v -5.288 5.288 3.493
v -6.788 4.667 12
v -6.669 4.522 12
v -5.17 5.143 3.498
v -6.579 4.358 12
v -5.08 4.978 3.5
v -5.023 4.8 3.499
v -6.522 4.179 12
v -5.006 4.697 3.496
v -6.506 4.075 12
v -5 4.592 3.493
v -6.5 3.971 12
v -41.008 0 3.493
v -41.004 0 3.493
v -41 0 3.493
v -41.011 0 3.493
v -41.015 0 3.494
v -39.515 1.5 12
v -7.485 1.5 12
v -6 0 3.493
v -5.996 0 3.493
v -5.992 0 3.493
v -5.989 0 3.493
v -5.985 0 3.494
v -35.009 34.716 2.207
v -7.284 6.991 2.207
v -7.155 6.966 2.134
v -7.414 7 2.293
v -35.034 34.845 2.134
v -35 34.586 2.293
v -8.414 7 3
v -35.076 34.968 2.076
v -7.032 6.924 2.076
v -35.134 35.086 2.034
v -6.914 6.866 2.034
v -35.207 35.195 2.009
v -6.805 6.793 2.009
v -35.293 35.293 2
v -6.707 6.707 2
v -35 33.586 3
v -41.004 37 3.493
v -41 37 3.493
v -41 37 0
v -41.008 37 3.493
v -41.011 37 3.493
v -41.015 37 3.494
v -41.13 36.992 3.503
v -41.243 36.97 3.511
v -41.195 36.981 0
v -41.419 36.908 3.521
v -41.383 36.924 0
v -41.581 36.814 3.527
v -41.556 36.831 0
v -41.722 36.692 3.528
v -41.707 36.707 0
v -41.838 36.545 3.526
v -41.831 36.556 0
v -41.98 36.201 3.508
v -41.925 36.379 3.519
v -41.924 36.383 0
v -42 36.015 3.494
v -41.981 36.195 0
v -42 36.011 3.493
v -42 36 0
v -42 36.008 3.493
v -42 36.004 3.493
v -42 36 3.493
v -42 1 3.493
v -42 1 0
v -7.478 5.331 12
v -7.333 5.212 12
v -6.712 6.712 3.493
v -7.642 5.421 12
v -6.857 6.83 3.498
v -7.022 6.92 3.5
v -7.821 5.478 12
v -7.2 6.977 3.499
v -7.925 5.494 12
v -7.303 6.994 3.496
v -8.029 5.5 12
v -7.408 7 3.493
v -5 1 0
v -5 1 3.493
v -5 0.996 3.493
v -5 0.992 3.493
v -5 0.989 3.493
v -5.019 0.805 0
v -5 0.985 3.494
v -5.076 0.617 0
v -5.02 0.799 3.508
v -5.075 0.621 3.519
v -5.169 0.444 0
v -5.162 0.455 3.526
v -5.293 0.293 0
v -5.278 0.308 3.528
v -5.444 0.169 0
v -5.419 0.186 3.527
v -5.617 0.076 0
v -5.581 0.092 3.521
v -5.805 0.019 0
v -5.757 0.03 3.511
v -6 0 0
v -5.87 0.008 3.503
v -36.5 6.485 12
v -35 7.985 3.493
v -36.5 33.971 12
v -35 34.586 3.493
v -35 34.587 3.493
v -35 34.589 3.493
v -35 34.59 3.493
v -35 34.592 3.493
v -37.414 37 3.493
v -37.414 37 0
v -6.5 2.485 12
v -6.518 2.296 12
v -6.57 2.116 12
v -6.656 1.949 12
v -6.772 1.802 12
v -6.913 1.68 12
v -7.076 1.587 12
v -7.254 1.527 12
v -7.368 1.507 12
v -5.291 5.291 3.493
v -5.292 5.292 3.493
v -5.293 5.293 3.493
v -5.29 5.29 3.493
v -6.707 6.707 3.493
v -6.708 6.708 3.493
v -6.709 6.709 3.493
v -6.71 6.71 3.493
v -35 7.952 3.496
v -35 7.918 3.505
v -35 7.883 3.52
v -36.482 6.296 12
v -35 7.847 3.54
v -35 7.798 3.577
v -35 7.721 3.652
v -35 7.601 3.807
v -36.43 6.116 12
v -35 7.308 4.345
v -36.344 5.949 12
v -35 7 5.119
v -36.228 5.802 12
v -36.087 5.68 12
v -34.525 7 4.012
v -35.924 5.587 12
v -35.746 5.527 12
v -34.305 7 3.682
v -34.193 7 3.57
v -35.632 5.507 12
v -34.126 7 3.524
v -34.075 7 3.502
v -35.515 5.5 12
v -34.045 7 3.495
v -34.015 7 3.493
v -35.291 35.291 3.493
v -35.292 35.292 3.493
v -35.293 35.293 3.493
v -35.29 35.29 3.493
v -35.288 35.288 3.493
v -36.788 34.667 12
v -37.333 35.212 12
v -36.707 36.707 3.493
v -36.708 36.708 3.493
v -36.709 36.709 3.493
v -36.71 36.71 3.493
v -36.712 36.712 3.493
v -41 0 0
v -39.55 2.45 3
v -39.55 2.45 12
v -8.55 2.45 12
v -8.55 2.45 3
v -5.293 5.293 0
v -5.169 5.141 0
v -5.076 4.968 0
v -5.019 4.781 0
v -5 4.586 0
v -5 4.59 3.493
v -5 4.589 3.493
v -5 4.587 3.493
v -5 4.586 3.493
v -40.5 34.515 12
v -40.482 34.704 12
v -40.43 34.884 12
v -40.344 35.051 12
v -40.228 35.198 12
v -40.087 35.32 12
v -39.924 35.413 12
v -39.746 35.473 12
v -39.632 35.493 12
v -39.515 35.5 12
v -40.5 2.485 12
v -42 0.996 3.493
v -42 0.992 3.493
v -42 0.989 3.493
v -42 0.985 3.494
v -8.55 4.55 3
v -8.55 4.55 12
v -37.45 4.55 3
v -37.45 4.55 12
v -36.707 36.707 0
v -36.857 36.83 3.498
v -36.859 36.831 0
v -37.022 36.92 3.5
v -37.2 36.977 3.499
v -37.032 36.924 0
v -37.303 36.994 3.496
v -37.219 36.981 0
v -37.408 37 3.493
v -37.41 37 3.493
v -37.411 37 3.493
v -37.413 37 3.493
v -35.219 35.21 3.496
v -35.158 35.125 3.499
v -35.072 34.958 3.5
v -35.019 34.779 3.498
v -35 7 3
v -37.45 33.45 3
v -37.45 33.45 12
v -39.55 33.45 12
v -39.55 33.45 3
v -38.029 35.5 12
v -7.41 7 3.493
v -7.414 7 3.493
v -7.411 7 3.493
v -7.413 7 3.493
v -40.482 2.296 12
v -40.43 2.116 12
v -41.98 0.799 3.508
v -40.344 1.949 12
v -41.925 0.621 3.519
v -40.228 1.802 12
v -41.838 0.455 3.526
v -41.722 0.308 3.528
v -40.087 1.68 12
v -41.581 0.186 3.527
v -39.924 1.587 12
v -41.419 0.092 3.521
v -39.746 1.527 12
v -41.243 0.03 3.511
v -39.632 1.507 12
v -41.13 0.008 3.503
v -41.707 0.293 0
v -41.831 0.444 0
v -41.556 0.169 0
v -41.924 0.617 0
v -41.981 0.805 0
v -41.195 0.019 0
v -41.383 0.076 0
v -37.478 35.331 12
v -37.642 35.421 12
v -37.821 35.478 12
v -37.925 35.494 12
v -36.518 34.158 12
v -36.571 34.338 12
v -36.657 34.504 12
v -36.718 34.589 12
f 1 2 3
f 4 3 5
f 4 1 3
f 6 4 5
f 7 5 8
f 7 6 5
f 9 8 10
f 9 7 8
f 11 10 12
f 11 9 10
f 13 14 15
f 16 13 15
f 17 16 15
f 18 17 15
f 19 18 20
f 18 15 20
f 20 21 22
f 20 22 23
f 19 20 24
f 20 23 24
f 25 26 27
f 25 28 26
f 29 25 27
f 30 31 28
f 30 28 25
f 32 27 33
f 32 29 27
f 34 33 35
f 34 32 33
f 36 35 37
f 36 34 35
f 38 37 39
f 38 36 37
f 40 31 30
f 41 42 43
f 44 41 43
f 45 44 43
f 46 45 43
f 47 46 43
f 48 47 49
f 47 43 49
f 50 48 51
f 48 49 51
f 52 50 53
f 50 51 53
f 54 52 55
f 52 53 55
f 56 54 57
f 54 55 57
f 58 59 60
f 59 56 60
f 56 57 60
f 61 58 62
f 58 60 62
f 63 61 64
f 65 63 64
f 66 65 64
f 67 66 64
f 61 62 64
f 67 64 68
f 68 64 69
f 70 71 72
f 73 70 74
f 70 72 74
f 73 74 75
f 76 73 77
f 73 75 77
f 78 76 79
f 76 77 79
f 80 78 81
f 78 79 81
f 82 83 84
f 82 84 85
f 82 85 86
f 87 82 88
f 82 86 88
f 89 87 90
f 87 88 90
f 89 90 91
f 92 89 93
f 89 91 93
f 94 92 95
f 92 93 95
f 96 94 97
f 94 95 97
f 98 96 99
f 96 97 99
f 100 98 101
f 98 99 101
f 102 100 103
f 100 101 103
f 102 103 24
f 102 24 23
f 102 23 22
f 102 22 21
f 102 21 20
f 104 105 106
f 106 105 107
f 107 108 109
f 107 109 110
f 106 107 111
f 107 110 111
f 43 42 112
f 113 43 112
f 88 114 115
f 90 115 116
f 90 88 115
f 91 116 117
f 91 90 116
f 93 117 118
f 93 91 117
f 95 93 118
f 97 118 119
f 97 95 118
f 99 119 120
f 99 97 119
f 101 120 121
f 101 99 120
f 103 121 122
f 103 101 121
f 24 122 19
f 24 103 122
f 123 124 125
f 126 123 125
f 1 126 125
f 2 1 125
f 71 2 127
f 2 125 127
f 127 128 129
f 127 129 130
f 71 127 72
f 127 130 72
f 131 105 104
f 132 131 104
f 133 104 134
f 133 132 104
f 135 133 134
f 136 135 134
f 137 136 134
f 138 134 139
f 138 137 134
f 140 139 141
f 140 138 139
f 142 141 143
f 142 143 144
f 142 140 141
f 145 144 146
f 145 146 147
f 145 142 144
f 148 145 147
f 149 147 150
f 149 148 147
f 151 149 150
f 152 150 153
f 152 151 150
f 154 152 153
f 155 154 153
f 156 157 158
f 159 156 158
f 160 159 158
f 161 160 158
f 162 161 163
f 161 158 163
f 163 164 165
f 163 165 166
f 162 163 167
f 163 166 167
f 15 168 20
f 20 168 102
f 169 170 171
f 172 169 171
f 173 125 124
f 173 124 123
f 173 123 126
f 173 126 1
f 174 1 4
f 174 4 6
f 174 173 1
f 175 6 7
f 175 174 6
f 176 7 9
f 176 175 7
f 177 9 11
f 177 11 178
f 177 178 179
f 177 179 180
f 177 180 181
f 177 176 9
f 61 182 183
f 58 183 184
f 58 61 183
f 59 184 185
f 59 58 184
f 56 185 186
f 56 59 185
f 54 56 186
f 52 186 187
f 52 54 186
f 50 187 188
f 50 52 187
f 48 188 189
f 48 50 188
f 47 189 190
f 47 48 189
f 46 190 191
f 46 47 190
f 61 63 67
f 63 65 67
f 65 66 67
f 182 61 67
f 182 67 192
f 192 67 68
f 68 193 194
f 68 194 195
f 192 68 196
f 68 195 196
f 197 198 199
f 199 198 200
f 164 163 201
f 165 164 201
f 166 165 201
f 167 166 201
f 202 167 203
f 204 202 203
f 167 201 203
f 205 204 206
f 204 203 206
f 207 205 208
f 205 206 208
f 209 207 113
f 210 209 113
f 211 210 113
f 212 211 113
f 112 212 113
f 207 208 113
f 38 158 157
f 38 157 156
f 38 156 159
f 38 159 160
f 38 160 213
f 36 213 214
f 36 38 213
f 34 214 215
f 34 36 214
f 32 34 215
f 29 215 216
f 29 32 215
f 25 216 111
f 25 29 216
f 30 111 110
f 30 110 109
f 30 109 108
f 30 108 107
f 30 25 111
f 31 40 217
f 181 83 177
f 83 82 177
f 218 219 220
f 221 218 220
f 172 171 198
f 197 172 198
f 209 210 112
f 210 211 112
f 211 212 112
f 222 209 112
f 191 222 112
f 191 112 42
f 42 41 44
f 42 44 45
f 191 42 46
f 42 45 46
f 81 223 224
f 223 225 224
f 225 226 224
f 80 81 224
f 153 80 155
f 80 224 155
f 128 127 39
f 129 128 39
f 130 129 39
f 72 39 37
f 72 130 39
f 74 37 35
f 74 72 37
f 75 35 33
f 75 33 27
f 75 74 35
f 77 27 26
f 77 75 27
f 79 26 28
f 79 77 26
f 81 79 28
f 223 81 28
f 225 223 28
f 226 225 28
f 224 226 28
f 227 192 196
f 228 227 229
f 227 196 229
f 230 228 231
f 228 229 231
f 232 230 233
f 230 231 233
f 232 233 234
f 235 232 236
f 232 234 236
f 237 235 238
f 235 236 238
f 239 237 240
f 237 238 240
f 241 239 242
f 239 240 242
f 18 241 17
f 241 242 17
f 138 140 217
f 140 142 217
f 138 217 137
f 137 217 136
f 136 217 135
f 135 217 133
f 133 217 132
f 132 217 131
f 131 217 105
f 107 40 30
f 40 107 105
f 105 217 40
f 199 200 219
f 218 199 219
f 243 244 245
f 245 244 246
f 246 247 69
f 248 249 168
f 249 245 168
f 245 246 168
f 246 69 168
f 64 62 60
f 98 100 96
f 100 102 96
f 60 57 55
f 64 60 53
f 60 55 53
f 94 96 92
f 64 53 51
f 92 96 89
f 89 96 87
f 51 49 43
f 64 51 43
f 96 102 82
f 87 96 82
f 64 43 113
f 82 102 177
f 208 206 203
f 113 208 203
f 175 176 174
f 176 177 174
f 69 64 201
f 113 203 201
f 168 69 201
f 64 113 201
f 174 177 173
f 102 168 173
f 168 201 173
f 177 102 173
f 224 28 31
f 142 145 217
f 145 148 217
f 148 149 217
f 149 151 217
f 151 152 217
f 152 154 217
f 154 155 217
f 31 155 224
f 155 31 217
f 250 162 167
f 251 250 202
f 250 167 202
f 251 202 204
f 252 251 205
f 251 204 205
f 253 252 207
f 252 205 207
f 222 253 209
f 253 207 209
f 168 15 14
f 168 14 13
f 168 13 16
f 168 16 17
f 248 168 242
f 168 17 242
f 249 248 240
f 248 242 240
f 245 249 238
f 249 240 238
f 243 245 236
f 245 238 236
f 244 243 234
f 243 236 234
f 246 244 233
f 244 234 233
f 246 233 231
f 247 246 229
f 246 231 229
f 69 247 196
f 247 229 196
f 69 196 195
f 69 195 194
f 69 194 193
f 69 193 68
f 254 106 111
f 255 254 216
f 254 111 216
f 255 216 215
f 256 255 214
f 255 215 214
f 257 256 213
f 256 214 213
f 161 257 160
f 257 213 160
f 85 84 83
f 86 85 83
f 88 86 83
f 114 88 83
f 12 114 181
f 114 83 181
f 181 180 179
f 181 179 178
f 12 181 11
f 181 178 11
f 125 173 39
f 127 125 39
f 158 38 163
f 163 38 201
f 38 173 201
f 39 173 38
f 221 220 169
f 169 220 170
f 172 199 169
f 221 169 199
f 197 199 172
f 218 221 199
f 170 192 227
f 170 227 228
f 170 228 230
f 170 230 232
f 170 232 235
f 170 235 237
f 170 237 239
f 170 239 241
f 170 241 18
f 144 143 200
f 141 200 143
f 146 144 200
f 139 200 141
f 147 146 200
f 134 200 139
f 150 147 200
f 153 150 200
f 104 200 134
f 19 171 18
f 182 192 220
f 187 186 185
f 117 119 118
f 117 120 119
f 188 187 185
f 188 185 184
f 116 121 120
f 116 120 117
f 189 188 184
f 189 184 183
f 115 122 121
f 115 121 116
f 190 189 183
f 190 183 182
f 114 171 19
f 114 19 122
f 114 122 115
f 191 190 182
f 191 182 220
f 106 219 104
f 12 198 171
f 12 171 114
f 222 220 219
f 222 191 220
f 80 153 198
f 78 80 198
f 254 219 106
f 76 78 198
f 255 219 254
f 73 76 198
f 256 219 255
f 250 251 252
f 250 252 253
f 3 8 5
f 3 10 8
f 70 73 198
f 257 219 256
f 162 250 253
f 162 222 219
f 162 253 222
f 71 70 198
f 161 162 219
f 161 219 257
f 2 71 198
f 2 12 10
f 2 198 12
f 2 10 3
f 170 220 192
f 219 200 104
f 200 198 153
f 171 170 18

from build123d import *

# Parameters (mm, degrees)
F1_DEPTH  = 3
F3_DEPTH  = 9
F5_DEPTH  = 9
F7_DEPTH  = 25
F9_DEPTH  = 25
F10_SIZE2 = 8.5069227294
F10_SIZE  = 1.5
F11_SIZE  = 1
F12_F1_R  = 1
F12_F2_R  = 1
F12_F3_R  = 1
F12_F4_R  = 1
F12_F5_R  = 1
F12_F6_R  = 1
F12_F7_R  = 1
F12_F8_R  = 1
F12_F9_R  = 1
F12_F10_R = 1
F12_F11_R = 1
F12_F12_R = 1
F12_F13_R = 1
F12_F14_R = 1
F12_F15_R = 1


with BuildPart() as f1:
    # F0 (on Top) → F1 (new body)
    with BuildSketch(Plane.XY):
        Polygon((0, 0), (-42, 42), (-42, 0), align=None)
    extrude(amount=F1_DEPTH)

    # F2 (on face) → F3 (join)
    with BuildSketch(Plane.XY.offset(3)):
        Polygon((-42, 37), (-42, 0), (-5, 0), (-5, 5), (-7, 7), (-35, 7), (-35, 35), (-37, 37), align=None)
    extrude(amount=F3_DEPTH)

    # F4 (on face) → F5 (cut)
    with BuildSketch(Plane.XY.offset(12)):
        Polygon((-39.55, 33.45), (-39.55, 2.45), (-8.55, 2.45), (-8.55, 4.55), (-37.45, 4.55), (-37.45, 33.45), align=None)
    extrude(amount=-F5_DEPTH, mode=Mode.SUBTRACT)

    # F6 (on face) → F7 (cut)
    with BuildSketch(Plane.XY.offset(3)):
        Polygon((-5, 5), (-5, 0), (0, 0), align=None)
    extrude(amount=-F7_DEPTH, mode=Mode.SUBTRACT)

    # F8 (on face) → F9 (cut)
    with BuildSketch(Plane.XY.offset(3)):
        Polygon((-42, 42), (-42, 37), (-37, 37), align=None)
    extrude(amount=-F9_DEPTH, mode=Mode.SUBTRACT)

    # F10
    f10_edges = [f1.edges().sort_by_distance(p)[0] for p in [
        (-23.5, 0, 12),
        (-5, 2.5, 12),
        (-6, 6, 12),
        (-21, 7, 12),
        (-35, 21, 12),
        (-36, 36, 12),
        (-39.5, 37, 12),
        (-42, 18.5, 12),
    ]]
    f10_side = f1.faces().sort_by_distance((-41.476741, 18.5, 12))[0]
    chamfer(f10_edges, length=F10_SIZE, length2=F10_SIZE2, reference=f10_side)

    # F11
    f11_edges = [f1.edges().sort_by_distance(p)[0] for p in [
        (-21, 21, 3),
    ]]
    chamfer(f11_edges, length=F11_SIZE)

    # F12: fillet of radius 1 on 17 edges, made by hand

    # F12_f1
    f12_f1_edges = [f1.edges().sort_by_distance(p)[0] for p in [
        (-7, 7, 2.5),
        (-7, 7, 3.2465386353),
    ]]
    fillet(f12_f1_edges, radius=F12_F1_R)

    # F12_f2
    f12_f2_edges = [f1.edges().sort_by_distance(p)[0] for p in [
        (-35, 35, 2.5),
        (-35, 35, 3.2465386353),
    ]]
    fillet(f12_f2_edges, radius=F12_F2_R)

    # F12_f3
    f12_f3_edges = [f1.edges().sort_by_distance(p)[0] for p in [
        (-5, 5, 1.7465386353),
    ]]
    fillet(f12_f3_edges, radius=F12_F3_R)

    # F12_f4
    f12_f4_edges = [f1.edges().sort_by_distance(p)[0] for p in [
        (-37, 37, 1.7465386353),
    ]]
    fillet(f12_f4_edges, radius=F12_F4_R)

    # F12_f5
    f12_f5_edges = [f1.edges().sort_by_distance(p)[0] for p in [
        (-5.7880602337, 4.6735747632, 7.962388947),
    ]]
    fillet(f12_f5_edges, radius=F12_F5_R)

    # F12_f6
    f12_f6_edges = [f1.edges().sort_by_distance(p)[0] for p in [
        (-7.3264252368, 6.2119397663, 7.962388947),
    ]]
    fillet(f12_f6_edges, radius=F12_F6_R)

    # F12_f7
    f12_f7_edges = [f1.edges().sort_by_distance(p)[0] for p in [
        (-5, 0, 1.7465386353),
    ]]
    fillet(f12_f7_edges, radius=F12_F7_R)

    # F12_f8
    f12_f8_edges = [f1.edges().sort_by_distance(p)[0] for p in [
        (-35.7880602337, 34.6735747632, 7.962388947),
    ]]
    fillet(f12_f8_edges, radius=F12_F8_R)

    # F12_f9
    f12_f9_edges = [f1.edges().sort_by_distance(p)[0] for p in [
        (-37.3264252368, 36.2119397663, 7.962388947),
    ]]
    fillet(f12_f9_edges, radius=F12_F9_R)

    # F12_f10
    f12_f10_edges = [f1.edges().sort_by_distance(p)[0] for p in [
        (-42, 37, 1.7465386353),
    ]]
    fillet(f12_f10_edges, radius=F12_F10_R)

    # F12_f11
    f12_f11_edges = [f1.edges().sort_by_distance(p)[0] for p in [
        (-35.75, 6.25, 7.7465386353),
    ]]
    fillet(f12_f11_edges, radius=F12_F11_R)

    # F12_f12
    f12_f12_edges = [f1.edges().sort_by_distance(p)[0] for p in [
        (-5.8964466094, 0.8964466094, 8.5770786288),
    ]]
    fillet(f12_f12_edges, radius=F12_F12_R)

    # F12_f13
    f12_f13_edges = [f1.edges().sort_by_distance(p)[0] for p in [
        (-42, 0, 1.7465386353),
    ]]
    fillet(f12_f13_edges, radius=F12_F13_R)

    # F12_f14
    f12_f14_edges = [f1.edges().sort_by_distance(p)[0] for p in [
        (-41.1035533906, 36.1035533906, 8.5770786288),
    ]]
    fillet(f12_f14_edges, radius=F12_F14_R)

    # F12_f15
    f12_f15_edges = [f1.edges().sort_by_distance(p)[0] for p in [
        (-41.1035533906, 0.8964466094, 8.5770786288),
    ]]
    fillet(f12_f15_edges, radius=F12_F15_R)


solid = f1.part
